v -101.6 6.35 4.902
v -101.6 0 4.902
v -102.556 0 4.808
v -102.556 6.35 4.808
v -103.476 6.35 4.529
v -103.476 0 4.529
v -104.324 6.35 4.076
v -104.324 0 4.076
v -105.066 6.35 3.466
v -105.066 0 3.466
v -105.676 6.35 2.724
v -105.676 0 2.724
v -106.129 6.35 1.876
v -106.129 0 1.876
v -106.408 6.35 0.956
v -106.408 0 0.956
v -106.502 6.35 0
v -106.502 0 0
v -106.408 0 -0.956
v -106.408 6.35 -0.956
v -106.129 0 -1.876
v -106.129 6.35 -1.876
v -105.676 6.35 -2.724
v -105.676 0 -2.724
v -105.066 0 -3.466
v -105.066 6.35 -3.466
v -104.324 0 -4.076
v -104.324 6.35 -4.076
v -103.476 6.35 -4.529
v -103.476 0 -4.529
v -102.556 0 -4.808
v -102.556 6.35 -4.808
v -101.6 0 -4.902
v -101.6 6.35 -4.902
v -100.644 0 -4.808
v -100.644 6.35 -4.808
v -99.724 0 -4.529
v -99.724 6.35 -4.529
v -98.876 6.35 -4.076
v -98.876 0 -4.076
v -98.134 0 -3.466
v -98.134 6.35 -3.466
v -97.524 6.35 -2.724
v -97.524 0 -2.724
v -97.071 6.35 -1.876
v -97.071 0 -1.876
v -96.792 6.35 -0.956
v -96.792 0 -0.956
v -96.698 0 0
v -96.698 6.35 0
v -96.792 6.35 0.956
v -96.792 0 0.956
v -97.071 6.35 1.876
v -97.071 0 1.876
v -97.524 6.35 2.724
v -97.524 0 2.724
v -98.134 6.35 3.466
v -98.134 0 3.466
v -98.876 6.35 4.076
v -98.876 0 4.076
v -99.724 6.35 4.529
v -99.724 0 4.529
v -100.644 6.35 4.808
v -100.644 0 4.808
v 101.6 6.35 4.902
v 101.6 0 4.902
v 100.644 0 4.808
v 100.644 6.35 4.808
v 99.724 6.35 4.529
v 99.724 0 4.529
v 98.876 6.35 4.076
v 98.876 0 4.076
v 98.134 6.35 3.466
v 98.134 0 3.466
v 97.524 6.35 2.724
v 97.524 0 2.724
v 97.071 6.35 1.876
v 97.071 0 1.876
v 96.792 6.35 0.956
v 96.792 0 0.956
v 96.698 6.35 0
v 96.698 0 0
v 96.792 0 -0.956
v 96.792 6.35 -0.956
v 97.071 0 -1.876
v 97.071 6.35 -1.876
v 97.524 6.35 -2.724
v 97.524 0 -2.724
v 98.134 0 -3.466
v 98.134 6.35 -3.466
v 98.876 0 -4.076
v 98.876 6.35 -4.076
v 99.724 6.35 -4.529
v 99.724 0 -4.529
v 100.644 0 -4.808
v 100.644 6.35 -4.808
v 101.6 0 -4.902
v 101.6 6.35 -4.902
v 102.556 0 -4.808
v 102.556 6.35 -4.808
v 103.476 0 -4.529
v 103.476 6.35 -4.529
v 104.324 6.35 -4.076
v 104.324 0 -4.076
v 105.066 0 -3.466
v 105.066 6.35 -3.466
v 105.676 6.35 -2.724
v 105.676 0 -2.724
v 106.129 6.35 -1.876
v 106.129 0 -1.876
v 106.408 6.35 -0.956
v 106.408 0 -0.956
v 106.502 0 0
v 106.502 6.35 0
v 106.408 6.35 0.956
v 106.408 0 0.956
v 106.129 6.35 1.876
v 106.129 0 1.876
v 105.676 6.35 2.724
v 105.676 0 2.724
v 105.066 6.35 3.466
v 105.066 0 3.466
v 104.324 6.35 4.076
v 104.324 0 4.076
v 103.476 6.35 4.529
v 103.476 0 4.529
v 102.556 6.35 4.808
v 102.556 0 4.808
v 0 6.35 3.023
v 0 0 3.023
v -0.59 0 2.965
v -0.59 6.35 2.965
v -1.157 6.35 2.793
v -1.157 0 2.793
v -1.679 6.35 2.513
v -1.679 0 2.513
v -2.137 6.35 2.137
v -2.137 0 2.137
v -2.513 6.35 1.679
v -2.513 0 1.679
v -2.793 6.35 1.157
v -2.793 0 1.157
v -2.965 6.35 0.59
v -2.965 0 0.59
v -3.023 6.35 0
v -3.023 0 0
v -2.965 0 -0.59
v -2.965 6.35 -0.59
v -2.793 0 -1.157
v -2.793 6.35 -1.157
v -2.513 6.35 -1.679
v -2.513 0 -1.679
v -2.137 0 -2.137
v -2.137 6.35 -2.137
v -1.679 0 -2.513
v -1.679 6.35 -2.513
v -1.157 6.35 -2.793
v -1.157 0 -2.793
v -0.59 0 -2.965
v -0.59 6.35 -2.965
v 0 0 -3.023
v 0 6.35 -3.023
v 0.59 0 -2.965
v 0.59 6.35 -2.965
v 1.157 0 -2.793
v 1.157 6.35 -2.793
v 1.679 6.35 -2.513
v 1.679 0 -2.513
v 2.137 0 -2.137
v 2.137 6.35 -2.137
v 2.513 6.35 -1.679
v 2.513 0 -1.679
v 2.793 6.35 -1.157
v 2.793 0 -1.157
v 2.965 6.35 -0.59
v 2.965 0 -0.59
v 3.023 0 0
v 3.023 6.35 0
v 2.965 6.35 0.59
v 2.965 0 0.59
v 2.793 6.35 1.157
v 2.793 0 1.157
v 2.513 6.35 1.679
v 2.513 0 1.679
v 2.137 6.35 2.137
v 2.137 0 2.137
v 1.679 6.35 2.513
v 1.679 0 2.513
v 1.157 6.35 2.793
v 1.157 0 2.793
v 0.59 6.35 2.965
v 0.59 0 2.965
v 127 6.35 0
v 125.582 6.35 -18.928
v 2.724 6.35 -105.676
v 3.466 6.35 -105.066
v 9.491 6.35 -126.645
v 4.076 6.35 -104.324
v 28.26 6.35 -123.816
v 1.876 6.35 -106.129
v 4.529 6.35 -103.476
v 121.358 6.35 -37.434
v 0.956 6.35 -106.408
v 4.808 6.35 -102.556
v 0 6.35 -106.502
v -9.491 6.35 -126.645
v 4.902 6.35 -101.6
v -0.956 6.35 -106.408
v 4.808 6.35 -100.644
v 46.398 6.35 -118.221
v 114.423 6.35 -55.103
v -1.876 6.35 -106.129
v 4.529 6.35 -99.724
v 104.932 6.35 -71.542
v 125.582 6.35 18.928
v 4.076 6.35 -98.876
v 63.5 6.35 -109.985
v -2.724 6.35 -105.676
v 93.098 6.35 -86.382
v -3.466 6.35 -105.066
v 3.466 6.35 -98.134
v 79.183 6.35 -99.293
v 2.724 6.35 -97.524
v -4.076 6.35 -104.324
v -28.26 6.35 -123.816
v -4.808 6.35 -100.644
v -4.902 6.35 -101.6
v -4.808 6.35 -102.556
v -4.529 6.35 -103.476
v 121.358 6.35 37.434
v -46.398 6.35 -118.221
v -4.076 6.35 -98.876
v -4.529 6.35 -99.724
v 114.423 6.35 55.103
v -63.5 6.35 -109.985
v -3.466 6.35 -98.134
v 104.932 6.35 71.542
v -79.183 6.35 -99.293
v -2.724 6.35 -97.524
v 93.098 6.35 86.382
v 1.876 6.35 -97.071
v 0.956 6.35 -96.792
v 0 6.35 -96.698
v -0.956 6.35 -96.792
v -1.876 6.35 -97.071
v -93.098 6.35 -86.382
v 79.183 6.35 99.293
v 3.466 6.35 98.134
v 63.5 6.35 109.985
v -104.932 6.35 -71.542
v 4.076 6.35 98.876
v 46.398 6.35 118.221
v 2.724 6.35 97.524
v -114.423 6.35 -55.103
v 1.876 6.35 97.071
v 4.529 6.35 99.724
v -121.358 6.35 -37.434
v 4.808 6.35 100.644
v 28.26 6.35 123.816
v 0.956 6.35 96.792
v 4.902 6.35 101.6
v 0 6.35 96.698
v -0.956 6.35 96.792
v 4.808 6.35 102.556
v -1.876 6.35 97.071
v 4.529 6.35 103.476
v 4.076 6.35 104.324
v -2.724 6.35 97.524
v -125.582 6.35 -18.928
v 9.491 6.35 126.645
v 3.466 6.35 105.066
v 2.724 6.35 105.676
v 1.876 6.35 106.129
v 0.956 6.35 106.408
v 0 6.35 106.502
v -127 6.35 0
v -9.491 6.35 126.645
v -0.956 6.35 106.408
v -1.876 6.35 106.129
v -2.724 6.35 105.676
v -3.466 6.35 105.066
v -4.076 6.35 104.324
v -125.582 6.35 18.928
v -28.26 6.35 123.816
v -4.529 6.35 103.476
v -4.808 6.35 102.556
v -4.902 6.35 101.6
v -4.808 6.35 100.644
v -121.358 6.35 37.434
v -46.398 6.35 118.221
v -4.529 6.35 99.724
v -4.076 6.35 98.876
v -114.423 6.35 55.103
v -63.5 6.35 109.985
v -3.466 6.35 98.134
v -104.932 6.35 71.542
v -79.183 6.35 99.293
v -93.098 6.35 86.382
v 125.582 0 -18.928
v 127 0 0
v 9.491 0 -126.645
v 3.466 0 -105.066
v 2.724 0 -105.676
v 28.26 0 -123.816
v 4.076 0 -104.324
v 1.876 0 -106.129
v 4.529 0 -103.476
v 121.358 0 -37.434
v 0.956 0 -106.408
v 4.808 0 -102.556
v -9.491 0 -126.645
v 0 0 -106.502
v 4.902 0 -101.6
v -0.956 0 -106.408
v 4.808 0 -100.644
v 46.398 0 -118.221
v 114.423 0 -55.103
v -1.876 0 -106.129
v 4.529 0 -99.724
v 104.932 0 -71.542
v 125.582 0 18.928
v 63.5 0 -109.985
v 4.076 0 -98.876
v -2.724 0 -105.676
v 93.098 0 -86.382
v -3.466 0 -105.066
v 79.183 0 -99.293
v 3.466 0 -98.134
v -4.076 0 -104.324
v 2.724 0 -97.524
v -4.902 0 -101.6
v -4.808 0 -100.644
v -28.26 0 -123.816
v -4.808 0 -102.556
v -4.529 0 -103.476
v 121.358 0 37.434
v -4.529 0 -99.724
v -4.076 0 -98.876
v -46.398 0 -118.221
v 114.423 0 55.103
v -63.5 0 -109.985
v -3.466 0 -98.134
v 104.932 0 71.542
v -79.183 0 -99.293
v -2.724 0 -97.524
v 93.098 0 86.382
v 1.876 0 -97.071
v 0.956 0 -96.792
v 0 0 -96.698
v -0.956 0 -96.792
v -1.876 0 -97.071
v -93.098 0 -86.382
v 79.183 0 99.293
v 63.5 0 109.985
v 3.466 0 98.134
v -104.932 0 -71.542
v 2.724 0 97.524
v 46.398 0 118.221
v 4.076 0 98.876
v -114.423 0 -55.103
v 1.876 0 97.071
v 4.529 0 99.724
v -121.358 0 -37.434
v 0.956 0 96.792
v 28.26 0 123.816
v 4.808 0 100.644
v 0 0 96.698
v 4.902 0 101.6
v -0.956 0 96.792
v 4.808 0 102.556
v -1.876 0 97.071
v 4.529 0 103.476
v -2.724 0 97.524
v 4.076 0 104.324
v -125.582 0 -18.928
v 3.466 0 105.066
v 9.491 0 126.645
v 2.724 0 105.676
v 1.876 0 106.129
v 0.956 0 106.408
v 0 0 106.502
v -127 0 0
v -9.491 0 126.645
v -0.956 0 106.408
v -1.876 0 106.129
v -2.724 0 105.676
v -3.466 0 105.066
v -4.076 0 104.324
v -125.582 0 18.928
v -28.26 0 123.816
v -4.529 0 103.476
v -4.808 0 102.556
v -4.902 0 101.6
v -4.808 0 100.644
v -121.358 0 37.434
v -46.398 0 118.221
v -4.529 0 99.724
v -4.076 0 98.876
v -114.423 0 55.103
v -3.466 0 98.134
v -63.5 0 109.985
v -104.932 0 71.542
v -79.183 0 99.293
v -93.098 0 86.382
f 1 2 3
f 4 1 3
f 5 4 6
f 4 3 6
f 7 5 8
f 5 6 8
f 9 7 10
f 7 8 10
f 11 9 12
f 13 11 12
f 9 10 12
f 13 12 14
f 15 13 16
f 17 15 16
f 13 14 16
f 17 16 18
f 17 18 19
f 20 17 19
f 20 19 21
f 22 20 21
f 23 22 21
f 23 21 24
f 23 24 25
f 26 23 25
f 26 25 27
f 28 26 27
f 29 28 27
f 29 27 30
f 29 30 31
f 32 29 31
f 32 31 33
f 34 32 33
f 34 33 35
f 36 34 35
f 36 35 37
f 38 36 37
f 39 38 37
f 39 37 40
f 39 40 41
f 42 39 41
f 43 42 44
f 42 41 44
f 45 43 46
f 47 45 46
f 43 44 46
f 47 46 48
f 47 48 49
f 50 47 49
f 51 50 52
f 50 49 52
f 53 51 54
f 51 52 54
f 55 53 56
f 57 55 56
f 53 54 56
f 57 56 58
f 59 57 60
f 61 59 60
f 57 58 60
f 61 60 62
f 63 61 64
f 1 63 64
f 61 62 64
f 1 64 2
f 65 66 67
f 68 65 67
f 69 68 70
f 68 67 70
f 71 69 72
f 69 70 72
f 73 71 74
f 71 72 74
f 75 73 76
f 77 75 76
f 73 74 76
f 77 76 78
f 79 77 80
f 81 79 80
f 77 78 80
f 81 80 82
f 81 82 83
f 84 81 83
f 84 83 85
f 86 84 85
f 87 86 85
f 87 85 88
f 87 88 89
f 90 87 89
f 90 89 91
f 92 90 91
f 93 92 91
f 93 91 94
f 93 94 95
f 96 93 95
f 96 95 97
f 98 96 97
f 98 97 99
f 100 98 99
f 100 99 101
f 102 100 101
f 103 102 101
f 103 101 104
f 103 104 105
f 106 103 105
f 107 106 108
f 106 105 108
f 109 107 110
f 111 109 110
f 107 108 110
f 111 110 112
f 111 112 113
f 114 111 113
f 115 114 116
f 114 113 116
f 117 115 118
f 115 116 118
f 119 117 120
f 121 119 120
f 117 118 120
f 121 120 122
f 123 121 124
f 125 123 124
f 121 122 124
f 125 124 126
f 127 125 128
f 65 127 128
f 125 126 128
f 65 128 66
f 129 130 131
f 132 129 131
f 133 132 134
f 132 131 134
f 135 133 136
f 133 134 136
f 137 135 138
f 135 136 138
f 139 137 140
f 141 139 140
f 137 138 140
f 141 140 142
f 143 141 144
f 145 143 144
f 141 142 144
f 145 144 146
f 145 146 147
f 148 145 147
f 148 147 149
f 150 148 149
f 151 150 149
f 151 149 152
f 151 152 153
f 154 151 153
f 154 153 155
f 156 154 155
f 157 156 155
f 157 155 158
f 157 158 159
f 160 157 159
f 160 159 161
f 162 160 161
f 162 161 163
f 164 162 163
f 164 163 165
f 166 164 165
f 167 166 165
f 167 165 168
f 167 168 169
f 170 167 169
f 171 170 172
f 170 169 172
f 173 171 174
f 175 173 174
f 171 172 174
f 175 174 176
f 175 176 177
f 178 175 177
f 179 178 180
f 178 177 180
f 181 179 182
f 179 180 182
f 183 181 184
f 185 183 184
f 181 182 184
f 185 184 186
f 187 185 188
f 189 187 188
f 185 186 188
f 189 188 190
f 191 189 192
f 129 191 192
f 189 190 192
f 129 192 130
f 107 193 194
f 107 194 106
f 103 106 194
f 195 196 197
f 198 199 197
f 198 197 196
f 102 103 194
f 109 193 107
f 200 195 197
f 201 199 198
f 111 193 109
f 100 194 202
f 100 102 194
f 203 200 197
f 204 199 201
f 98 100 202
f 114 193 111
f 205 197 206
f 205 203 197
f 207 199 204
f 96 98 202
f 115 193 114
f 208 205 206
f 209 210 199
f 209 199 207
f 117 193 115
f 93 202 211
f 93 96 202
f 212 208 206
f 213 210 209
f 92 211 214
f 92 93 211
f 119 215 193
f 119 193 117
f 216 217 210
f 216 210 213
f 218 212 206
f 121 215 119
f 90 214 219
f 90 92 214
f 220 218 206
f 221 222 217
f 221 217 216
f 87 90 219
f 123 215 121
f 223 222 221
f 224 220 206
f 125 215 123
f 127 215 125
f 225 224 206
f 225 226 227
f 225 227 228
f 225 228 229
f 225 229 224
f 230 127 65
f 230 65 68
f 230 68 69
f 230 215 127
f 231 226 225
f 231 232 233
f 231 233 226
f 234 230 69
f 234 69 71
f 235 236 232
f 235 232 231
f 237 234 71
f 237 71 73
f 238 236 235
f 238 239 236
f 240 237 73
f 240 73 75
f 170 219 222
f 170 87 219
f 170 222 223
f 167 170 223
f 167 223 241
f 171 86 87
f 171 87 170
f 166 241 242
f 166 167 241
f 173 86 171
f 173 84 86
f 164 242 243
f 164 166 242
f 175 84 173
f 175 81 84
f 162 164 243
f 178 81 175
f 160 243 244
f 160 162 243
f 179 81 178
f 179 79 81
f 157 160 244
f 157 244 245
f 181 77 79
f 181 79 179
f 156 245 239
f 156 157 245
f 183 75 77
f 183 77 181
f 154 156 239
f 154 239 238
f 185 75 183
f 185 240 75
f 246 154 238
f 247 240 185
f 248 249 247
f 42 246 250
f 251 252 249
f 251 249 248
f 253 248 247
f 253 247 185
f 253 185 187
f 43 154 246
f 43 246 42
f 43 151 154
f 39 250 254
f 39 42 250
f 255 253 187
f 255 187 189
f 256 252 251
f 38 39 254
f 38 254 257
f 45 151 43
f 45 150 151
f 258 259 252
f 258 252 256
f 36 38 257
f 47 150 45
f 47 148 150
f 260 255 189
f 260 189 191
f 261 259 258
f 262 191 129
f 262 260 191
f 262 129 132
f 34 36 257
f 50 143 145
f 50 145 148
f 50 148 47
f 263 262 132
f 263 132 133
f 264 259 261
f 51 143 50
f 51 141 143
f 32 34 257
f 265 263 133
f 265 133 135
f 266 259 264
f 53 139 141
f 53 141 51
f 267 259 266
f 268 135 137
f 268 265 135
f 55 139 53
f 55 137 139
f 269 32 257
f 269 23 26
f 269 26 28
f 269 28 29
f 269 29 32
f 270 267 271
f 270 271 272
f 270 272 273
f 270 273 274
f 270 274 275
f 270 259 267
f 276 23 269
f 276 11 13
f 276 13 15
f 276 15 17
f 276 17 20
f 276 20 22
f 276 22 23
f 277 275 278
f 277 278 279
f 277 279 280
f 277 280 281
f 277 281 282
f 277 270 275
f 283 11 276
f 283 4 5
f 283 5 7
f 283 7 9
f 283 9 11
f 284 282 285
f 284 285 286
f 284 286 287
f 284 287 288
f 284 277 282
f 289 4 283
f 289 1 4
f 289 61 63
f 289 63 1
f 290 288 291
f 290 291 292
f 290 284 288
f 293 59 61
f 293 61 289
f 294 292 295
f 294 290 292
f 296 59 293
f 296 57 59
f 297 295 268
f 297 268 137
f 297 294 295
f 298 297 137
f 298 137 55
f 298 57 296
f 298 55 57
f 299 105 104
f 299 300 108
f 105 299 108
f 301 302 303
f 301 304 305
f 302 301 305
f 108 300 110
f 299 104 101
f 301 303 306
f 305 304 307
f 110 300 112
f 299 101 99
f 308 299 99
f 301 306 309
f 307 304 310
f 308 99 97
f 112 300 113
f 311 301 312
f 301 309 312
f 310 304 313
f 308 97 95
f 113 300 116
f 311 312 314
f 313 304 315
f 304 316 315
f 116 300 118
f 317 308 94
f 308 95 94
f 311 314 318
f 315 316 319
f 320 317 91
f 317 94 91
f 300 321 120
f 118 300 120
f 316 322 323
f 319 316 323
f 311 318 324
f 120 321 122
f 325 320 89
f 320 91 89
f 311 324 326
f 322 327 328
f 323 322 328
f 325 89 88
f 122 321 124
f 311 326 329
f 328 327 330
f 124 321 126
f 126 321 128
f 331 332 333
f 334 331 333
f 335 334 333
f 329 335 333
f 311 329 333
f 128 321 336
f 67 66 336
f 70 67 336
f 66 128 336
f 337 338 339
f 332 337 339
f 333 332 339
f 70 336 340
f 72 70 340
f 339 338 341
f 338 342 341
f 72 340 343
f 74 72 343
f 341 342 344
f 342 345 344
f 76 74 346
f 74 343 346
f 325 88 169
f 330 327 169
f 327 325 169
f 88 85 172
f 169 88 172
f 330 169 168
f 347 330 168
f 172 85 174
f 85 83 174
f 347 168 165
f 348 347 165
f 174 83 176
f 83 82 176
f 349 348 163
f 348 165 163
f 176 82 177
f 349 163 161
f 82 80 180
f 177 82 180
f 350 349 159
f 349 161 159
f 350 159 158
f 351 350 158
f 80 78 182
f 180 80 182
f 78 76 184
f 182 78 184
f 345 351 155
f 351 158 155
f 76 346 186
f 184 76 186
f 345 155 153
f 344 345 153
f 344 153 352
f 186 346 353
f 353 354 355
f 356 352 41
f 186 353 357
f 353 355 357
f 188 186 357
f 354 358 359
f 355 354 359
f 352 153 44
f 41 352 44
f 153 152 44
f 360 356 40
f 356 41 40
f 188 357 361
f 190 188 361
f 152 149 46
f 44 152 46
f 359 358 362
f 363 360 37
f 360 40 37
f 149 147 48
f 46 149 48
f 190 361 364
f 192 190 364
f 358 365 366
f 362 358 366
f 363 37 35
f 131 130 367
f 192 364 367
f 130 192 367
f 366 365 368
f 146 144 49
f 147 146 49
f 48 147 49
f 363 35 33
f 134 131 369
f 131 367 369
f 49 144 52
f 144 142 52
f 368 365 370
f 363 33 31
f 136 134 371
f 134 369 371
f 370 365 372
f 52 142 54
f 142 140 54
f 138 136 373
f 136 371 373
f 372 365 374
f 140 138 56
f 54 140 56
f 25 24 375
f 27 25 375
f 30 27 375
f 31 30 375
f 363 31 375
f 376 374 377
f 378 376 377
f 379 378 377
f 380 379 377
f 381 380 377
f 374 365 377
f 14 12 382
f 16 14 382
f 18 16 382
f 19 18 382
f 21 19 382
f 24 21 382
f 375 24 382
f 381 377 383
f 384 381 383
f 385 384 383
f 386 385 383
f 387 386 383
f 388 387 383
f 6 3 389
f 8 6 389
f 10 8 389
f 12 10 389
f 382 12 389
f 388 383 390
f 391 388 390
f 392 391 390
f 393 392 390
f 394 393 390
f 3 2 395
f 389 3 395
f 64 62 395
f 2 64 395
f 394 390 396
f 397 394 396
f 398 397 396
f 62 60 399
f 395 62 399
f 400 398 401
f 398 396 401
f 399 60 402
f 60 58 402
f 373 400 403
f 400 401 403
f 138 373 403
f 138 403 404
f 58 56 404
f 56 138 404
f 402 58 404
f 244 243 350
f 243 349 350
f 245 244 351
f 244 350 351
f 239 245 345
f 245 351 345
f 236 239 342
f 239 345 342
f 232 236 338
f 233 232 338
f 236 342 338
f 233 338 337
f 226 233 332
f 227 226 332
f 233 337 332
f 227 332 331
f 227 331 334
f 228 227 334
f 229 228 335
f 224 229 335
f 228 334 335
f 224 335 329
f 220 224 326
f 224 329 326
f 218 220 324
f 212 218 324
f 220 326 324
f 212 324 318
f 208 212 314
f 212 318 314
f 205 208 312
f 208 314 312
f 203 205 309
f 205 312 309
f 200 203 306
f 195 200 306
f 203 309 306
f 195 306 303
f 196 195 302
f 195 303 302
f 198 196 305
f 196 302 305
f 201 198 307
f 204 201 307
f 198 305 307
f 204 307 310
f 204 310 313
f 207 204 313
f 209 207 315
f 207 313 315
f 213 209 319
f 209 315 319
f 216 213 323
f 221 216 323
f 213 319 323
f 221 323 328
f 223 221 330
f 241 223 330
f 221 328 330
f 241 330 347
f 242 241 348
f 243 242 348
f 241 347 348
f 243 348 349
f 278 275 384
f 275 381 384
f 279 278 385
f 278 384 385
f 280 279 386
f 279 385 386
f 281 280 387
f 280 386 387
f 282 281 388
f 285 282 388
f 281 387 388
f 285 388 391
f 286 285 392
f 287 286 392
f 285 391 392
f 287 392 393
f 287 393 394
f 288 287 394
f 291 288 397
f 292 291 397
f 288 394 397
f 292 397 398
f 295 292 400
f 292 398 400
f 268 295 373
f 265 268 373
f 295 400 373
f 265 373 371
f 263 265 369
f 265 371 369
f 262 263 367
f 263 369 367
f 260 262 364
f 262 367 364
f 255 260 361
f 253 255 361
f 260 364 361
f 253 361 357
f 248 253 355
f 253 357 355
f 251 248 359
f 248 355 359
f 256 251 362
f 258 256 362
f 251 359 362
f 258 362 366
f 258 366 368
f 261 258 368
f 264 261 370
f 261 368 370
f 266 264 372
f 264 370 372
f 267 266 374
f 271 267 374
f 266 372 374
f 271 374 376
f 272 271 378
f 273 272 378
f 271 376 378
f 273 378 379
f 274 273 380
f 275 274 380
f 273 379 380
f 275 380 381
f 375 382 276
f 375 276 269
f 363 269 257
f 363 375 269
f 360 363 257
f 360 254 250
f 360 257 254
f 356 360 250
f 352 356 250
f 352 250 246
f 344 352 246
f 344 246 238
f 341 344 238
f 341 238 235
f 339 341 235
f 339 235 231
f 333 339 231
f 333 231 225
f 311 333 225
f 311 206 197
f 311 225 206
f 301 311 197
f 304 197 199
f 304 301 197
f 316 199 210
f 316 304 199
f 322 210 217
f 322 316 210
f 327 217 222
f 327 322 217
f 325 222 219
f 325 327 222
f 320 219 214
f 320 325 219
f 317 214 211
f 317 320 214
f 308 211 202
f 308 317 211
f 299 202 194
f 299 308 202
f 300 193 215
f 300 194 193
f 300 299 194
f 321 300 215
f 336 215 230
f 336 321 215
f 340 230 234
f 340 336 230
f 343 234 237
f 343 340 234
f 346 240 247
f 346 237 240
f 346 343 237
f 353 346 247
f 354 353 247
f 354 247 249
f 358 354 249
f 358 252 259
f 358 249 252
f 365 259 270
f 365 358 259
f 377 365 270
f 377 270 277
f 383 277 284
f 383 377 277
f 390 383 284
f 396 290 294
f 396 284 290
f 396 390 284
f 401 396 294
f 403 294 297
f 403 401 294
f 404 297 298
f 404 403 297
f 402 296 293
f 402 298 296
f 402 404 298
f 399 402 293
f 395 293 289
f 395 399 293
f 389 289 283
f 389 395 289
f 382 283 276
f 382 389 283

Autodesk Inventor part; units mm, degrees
ref_plane "YZ Plane" through (0, 0, 0) normal (1, 0, 0) x (0, 1, 0)
ref_plane "XZ Plane" through (0, 0, 0) normal (0, 1, 0) x (-1, 0, 0)
ref_plane "XY Plane" through (0, 0, 0) normal (0, 0, 1) x (1, 0, 0)
sketch "Sketch1" plane through (0, 0, 0) normal (0, 1, 0) x (-1, 0, 0)
  circle A0 centre (0, 0) radius 127
  dimension "d0" = 254
extrude "Extrusion1" add sketch "Sketch1" along normal blind 6.35
sketch "Sketch2" plane through (0, 6.35, 0) normal (0, 1, 0) x (1, 0, 0)
  point P0 (0, 0)
  point P1 (0, 0)
hole "Hole1" at (0, 6.35, 0) direction (0, -1, 0) diameter 6.0452 end through all
sketch "Sketch3" plane through (0, 6.35, 0) normal (0, 1, 0) x (1, 0, 0)
  circle A0 centre (0, 0) radius 3.0226 projected
  circle A1 centre (0, 0) radius 101.6
  point P0 (-101.6, 0)
  point P1 (0, -101.6)
  point P2 (0, 101.6)
  point P3 (101.6, 0)
  dimension "d10" = 203.2
hole "Hole2" at (-101.6, 6.35, 0) at (0, 6.35, 101.6) at (0, 6.35, -101.6) at (101.6, 6.35, 0) direction (0, -1, 0) diameter 9.8044 end through all
properties part number "Keep Out RSX Deck"
